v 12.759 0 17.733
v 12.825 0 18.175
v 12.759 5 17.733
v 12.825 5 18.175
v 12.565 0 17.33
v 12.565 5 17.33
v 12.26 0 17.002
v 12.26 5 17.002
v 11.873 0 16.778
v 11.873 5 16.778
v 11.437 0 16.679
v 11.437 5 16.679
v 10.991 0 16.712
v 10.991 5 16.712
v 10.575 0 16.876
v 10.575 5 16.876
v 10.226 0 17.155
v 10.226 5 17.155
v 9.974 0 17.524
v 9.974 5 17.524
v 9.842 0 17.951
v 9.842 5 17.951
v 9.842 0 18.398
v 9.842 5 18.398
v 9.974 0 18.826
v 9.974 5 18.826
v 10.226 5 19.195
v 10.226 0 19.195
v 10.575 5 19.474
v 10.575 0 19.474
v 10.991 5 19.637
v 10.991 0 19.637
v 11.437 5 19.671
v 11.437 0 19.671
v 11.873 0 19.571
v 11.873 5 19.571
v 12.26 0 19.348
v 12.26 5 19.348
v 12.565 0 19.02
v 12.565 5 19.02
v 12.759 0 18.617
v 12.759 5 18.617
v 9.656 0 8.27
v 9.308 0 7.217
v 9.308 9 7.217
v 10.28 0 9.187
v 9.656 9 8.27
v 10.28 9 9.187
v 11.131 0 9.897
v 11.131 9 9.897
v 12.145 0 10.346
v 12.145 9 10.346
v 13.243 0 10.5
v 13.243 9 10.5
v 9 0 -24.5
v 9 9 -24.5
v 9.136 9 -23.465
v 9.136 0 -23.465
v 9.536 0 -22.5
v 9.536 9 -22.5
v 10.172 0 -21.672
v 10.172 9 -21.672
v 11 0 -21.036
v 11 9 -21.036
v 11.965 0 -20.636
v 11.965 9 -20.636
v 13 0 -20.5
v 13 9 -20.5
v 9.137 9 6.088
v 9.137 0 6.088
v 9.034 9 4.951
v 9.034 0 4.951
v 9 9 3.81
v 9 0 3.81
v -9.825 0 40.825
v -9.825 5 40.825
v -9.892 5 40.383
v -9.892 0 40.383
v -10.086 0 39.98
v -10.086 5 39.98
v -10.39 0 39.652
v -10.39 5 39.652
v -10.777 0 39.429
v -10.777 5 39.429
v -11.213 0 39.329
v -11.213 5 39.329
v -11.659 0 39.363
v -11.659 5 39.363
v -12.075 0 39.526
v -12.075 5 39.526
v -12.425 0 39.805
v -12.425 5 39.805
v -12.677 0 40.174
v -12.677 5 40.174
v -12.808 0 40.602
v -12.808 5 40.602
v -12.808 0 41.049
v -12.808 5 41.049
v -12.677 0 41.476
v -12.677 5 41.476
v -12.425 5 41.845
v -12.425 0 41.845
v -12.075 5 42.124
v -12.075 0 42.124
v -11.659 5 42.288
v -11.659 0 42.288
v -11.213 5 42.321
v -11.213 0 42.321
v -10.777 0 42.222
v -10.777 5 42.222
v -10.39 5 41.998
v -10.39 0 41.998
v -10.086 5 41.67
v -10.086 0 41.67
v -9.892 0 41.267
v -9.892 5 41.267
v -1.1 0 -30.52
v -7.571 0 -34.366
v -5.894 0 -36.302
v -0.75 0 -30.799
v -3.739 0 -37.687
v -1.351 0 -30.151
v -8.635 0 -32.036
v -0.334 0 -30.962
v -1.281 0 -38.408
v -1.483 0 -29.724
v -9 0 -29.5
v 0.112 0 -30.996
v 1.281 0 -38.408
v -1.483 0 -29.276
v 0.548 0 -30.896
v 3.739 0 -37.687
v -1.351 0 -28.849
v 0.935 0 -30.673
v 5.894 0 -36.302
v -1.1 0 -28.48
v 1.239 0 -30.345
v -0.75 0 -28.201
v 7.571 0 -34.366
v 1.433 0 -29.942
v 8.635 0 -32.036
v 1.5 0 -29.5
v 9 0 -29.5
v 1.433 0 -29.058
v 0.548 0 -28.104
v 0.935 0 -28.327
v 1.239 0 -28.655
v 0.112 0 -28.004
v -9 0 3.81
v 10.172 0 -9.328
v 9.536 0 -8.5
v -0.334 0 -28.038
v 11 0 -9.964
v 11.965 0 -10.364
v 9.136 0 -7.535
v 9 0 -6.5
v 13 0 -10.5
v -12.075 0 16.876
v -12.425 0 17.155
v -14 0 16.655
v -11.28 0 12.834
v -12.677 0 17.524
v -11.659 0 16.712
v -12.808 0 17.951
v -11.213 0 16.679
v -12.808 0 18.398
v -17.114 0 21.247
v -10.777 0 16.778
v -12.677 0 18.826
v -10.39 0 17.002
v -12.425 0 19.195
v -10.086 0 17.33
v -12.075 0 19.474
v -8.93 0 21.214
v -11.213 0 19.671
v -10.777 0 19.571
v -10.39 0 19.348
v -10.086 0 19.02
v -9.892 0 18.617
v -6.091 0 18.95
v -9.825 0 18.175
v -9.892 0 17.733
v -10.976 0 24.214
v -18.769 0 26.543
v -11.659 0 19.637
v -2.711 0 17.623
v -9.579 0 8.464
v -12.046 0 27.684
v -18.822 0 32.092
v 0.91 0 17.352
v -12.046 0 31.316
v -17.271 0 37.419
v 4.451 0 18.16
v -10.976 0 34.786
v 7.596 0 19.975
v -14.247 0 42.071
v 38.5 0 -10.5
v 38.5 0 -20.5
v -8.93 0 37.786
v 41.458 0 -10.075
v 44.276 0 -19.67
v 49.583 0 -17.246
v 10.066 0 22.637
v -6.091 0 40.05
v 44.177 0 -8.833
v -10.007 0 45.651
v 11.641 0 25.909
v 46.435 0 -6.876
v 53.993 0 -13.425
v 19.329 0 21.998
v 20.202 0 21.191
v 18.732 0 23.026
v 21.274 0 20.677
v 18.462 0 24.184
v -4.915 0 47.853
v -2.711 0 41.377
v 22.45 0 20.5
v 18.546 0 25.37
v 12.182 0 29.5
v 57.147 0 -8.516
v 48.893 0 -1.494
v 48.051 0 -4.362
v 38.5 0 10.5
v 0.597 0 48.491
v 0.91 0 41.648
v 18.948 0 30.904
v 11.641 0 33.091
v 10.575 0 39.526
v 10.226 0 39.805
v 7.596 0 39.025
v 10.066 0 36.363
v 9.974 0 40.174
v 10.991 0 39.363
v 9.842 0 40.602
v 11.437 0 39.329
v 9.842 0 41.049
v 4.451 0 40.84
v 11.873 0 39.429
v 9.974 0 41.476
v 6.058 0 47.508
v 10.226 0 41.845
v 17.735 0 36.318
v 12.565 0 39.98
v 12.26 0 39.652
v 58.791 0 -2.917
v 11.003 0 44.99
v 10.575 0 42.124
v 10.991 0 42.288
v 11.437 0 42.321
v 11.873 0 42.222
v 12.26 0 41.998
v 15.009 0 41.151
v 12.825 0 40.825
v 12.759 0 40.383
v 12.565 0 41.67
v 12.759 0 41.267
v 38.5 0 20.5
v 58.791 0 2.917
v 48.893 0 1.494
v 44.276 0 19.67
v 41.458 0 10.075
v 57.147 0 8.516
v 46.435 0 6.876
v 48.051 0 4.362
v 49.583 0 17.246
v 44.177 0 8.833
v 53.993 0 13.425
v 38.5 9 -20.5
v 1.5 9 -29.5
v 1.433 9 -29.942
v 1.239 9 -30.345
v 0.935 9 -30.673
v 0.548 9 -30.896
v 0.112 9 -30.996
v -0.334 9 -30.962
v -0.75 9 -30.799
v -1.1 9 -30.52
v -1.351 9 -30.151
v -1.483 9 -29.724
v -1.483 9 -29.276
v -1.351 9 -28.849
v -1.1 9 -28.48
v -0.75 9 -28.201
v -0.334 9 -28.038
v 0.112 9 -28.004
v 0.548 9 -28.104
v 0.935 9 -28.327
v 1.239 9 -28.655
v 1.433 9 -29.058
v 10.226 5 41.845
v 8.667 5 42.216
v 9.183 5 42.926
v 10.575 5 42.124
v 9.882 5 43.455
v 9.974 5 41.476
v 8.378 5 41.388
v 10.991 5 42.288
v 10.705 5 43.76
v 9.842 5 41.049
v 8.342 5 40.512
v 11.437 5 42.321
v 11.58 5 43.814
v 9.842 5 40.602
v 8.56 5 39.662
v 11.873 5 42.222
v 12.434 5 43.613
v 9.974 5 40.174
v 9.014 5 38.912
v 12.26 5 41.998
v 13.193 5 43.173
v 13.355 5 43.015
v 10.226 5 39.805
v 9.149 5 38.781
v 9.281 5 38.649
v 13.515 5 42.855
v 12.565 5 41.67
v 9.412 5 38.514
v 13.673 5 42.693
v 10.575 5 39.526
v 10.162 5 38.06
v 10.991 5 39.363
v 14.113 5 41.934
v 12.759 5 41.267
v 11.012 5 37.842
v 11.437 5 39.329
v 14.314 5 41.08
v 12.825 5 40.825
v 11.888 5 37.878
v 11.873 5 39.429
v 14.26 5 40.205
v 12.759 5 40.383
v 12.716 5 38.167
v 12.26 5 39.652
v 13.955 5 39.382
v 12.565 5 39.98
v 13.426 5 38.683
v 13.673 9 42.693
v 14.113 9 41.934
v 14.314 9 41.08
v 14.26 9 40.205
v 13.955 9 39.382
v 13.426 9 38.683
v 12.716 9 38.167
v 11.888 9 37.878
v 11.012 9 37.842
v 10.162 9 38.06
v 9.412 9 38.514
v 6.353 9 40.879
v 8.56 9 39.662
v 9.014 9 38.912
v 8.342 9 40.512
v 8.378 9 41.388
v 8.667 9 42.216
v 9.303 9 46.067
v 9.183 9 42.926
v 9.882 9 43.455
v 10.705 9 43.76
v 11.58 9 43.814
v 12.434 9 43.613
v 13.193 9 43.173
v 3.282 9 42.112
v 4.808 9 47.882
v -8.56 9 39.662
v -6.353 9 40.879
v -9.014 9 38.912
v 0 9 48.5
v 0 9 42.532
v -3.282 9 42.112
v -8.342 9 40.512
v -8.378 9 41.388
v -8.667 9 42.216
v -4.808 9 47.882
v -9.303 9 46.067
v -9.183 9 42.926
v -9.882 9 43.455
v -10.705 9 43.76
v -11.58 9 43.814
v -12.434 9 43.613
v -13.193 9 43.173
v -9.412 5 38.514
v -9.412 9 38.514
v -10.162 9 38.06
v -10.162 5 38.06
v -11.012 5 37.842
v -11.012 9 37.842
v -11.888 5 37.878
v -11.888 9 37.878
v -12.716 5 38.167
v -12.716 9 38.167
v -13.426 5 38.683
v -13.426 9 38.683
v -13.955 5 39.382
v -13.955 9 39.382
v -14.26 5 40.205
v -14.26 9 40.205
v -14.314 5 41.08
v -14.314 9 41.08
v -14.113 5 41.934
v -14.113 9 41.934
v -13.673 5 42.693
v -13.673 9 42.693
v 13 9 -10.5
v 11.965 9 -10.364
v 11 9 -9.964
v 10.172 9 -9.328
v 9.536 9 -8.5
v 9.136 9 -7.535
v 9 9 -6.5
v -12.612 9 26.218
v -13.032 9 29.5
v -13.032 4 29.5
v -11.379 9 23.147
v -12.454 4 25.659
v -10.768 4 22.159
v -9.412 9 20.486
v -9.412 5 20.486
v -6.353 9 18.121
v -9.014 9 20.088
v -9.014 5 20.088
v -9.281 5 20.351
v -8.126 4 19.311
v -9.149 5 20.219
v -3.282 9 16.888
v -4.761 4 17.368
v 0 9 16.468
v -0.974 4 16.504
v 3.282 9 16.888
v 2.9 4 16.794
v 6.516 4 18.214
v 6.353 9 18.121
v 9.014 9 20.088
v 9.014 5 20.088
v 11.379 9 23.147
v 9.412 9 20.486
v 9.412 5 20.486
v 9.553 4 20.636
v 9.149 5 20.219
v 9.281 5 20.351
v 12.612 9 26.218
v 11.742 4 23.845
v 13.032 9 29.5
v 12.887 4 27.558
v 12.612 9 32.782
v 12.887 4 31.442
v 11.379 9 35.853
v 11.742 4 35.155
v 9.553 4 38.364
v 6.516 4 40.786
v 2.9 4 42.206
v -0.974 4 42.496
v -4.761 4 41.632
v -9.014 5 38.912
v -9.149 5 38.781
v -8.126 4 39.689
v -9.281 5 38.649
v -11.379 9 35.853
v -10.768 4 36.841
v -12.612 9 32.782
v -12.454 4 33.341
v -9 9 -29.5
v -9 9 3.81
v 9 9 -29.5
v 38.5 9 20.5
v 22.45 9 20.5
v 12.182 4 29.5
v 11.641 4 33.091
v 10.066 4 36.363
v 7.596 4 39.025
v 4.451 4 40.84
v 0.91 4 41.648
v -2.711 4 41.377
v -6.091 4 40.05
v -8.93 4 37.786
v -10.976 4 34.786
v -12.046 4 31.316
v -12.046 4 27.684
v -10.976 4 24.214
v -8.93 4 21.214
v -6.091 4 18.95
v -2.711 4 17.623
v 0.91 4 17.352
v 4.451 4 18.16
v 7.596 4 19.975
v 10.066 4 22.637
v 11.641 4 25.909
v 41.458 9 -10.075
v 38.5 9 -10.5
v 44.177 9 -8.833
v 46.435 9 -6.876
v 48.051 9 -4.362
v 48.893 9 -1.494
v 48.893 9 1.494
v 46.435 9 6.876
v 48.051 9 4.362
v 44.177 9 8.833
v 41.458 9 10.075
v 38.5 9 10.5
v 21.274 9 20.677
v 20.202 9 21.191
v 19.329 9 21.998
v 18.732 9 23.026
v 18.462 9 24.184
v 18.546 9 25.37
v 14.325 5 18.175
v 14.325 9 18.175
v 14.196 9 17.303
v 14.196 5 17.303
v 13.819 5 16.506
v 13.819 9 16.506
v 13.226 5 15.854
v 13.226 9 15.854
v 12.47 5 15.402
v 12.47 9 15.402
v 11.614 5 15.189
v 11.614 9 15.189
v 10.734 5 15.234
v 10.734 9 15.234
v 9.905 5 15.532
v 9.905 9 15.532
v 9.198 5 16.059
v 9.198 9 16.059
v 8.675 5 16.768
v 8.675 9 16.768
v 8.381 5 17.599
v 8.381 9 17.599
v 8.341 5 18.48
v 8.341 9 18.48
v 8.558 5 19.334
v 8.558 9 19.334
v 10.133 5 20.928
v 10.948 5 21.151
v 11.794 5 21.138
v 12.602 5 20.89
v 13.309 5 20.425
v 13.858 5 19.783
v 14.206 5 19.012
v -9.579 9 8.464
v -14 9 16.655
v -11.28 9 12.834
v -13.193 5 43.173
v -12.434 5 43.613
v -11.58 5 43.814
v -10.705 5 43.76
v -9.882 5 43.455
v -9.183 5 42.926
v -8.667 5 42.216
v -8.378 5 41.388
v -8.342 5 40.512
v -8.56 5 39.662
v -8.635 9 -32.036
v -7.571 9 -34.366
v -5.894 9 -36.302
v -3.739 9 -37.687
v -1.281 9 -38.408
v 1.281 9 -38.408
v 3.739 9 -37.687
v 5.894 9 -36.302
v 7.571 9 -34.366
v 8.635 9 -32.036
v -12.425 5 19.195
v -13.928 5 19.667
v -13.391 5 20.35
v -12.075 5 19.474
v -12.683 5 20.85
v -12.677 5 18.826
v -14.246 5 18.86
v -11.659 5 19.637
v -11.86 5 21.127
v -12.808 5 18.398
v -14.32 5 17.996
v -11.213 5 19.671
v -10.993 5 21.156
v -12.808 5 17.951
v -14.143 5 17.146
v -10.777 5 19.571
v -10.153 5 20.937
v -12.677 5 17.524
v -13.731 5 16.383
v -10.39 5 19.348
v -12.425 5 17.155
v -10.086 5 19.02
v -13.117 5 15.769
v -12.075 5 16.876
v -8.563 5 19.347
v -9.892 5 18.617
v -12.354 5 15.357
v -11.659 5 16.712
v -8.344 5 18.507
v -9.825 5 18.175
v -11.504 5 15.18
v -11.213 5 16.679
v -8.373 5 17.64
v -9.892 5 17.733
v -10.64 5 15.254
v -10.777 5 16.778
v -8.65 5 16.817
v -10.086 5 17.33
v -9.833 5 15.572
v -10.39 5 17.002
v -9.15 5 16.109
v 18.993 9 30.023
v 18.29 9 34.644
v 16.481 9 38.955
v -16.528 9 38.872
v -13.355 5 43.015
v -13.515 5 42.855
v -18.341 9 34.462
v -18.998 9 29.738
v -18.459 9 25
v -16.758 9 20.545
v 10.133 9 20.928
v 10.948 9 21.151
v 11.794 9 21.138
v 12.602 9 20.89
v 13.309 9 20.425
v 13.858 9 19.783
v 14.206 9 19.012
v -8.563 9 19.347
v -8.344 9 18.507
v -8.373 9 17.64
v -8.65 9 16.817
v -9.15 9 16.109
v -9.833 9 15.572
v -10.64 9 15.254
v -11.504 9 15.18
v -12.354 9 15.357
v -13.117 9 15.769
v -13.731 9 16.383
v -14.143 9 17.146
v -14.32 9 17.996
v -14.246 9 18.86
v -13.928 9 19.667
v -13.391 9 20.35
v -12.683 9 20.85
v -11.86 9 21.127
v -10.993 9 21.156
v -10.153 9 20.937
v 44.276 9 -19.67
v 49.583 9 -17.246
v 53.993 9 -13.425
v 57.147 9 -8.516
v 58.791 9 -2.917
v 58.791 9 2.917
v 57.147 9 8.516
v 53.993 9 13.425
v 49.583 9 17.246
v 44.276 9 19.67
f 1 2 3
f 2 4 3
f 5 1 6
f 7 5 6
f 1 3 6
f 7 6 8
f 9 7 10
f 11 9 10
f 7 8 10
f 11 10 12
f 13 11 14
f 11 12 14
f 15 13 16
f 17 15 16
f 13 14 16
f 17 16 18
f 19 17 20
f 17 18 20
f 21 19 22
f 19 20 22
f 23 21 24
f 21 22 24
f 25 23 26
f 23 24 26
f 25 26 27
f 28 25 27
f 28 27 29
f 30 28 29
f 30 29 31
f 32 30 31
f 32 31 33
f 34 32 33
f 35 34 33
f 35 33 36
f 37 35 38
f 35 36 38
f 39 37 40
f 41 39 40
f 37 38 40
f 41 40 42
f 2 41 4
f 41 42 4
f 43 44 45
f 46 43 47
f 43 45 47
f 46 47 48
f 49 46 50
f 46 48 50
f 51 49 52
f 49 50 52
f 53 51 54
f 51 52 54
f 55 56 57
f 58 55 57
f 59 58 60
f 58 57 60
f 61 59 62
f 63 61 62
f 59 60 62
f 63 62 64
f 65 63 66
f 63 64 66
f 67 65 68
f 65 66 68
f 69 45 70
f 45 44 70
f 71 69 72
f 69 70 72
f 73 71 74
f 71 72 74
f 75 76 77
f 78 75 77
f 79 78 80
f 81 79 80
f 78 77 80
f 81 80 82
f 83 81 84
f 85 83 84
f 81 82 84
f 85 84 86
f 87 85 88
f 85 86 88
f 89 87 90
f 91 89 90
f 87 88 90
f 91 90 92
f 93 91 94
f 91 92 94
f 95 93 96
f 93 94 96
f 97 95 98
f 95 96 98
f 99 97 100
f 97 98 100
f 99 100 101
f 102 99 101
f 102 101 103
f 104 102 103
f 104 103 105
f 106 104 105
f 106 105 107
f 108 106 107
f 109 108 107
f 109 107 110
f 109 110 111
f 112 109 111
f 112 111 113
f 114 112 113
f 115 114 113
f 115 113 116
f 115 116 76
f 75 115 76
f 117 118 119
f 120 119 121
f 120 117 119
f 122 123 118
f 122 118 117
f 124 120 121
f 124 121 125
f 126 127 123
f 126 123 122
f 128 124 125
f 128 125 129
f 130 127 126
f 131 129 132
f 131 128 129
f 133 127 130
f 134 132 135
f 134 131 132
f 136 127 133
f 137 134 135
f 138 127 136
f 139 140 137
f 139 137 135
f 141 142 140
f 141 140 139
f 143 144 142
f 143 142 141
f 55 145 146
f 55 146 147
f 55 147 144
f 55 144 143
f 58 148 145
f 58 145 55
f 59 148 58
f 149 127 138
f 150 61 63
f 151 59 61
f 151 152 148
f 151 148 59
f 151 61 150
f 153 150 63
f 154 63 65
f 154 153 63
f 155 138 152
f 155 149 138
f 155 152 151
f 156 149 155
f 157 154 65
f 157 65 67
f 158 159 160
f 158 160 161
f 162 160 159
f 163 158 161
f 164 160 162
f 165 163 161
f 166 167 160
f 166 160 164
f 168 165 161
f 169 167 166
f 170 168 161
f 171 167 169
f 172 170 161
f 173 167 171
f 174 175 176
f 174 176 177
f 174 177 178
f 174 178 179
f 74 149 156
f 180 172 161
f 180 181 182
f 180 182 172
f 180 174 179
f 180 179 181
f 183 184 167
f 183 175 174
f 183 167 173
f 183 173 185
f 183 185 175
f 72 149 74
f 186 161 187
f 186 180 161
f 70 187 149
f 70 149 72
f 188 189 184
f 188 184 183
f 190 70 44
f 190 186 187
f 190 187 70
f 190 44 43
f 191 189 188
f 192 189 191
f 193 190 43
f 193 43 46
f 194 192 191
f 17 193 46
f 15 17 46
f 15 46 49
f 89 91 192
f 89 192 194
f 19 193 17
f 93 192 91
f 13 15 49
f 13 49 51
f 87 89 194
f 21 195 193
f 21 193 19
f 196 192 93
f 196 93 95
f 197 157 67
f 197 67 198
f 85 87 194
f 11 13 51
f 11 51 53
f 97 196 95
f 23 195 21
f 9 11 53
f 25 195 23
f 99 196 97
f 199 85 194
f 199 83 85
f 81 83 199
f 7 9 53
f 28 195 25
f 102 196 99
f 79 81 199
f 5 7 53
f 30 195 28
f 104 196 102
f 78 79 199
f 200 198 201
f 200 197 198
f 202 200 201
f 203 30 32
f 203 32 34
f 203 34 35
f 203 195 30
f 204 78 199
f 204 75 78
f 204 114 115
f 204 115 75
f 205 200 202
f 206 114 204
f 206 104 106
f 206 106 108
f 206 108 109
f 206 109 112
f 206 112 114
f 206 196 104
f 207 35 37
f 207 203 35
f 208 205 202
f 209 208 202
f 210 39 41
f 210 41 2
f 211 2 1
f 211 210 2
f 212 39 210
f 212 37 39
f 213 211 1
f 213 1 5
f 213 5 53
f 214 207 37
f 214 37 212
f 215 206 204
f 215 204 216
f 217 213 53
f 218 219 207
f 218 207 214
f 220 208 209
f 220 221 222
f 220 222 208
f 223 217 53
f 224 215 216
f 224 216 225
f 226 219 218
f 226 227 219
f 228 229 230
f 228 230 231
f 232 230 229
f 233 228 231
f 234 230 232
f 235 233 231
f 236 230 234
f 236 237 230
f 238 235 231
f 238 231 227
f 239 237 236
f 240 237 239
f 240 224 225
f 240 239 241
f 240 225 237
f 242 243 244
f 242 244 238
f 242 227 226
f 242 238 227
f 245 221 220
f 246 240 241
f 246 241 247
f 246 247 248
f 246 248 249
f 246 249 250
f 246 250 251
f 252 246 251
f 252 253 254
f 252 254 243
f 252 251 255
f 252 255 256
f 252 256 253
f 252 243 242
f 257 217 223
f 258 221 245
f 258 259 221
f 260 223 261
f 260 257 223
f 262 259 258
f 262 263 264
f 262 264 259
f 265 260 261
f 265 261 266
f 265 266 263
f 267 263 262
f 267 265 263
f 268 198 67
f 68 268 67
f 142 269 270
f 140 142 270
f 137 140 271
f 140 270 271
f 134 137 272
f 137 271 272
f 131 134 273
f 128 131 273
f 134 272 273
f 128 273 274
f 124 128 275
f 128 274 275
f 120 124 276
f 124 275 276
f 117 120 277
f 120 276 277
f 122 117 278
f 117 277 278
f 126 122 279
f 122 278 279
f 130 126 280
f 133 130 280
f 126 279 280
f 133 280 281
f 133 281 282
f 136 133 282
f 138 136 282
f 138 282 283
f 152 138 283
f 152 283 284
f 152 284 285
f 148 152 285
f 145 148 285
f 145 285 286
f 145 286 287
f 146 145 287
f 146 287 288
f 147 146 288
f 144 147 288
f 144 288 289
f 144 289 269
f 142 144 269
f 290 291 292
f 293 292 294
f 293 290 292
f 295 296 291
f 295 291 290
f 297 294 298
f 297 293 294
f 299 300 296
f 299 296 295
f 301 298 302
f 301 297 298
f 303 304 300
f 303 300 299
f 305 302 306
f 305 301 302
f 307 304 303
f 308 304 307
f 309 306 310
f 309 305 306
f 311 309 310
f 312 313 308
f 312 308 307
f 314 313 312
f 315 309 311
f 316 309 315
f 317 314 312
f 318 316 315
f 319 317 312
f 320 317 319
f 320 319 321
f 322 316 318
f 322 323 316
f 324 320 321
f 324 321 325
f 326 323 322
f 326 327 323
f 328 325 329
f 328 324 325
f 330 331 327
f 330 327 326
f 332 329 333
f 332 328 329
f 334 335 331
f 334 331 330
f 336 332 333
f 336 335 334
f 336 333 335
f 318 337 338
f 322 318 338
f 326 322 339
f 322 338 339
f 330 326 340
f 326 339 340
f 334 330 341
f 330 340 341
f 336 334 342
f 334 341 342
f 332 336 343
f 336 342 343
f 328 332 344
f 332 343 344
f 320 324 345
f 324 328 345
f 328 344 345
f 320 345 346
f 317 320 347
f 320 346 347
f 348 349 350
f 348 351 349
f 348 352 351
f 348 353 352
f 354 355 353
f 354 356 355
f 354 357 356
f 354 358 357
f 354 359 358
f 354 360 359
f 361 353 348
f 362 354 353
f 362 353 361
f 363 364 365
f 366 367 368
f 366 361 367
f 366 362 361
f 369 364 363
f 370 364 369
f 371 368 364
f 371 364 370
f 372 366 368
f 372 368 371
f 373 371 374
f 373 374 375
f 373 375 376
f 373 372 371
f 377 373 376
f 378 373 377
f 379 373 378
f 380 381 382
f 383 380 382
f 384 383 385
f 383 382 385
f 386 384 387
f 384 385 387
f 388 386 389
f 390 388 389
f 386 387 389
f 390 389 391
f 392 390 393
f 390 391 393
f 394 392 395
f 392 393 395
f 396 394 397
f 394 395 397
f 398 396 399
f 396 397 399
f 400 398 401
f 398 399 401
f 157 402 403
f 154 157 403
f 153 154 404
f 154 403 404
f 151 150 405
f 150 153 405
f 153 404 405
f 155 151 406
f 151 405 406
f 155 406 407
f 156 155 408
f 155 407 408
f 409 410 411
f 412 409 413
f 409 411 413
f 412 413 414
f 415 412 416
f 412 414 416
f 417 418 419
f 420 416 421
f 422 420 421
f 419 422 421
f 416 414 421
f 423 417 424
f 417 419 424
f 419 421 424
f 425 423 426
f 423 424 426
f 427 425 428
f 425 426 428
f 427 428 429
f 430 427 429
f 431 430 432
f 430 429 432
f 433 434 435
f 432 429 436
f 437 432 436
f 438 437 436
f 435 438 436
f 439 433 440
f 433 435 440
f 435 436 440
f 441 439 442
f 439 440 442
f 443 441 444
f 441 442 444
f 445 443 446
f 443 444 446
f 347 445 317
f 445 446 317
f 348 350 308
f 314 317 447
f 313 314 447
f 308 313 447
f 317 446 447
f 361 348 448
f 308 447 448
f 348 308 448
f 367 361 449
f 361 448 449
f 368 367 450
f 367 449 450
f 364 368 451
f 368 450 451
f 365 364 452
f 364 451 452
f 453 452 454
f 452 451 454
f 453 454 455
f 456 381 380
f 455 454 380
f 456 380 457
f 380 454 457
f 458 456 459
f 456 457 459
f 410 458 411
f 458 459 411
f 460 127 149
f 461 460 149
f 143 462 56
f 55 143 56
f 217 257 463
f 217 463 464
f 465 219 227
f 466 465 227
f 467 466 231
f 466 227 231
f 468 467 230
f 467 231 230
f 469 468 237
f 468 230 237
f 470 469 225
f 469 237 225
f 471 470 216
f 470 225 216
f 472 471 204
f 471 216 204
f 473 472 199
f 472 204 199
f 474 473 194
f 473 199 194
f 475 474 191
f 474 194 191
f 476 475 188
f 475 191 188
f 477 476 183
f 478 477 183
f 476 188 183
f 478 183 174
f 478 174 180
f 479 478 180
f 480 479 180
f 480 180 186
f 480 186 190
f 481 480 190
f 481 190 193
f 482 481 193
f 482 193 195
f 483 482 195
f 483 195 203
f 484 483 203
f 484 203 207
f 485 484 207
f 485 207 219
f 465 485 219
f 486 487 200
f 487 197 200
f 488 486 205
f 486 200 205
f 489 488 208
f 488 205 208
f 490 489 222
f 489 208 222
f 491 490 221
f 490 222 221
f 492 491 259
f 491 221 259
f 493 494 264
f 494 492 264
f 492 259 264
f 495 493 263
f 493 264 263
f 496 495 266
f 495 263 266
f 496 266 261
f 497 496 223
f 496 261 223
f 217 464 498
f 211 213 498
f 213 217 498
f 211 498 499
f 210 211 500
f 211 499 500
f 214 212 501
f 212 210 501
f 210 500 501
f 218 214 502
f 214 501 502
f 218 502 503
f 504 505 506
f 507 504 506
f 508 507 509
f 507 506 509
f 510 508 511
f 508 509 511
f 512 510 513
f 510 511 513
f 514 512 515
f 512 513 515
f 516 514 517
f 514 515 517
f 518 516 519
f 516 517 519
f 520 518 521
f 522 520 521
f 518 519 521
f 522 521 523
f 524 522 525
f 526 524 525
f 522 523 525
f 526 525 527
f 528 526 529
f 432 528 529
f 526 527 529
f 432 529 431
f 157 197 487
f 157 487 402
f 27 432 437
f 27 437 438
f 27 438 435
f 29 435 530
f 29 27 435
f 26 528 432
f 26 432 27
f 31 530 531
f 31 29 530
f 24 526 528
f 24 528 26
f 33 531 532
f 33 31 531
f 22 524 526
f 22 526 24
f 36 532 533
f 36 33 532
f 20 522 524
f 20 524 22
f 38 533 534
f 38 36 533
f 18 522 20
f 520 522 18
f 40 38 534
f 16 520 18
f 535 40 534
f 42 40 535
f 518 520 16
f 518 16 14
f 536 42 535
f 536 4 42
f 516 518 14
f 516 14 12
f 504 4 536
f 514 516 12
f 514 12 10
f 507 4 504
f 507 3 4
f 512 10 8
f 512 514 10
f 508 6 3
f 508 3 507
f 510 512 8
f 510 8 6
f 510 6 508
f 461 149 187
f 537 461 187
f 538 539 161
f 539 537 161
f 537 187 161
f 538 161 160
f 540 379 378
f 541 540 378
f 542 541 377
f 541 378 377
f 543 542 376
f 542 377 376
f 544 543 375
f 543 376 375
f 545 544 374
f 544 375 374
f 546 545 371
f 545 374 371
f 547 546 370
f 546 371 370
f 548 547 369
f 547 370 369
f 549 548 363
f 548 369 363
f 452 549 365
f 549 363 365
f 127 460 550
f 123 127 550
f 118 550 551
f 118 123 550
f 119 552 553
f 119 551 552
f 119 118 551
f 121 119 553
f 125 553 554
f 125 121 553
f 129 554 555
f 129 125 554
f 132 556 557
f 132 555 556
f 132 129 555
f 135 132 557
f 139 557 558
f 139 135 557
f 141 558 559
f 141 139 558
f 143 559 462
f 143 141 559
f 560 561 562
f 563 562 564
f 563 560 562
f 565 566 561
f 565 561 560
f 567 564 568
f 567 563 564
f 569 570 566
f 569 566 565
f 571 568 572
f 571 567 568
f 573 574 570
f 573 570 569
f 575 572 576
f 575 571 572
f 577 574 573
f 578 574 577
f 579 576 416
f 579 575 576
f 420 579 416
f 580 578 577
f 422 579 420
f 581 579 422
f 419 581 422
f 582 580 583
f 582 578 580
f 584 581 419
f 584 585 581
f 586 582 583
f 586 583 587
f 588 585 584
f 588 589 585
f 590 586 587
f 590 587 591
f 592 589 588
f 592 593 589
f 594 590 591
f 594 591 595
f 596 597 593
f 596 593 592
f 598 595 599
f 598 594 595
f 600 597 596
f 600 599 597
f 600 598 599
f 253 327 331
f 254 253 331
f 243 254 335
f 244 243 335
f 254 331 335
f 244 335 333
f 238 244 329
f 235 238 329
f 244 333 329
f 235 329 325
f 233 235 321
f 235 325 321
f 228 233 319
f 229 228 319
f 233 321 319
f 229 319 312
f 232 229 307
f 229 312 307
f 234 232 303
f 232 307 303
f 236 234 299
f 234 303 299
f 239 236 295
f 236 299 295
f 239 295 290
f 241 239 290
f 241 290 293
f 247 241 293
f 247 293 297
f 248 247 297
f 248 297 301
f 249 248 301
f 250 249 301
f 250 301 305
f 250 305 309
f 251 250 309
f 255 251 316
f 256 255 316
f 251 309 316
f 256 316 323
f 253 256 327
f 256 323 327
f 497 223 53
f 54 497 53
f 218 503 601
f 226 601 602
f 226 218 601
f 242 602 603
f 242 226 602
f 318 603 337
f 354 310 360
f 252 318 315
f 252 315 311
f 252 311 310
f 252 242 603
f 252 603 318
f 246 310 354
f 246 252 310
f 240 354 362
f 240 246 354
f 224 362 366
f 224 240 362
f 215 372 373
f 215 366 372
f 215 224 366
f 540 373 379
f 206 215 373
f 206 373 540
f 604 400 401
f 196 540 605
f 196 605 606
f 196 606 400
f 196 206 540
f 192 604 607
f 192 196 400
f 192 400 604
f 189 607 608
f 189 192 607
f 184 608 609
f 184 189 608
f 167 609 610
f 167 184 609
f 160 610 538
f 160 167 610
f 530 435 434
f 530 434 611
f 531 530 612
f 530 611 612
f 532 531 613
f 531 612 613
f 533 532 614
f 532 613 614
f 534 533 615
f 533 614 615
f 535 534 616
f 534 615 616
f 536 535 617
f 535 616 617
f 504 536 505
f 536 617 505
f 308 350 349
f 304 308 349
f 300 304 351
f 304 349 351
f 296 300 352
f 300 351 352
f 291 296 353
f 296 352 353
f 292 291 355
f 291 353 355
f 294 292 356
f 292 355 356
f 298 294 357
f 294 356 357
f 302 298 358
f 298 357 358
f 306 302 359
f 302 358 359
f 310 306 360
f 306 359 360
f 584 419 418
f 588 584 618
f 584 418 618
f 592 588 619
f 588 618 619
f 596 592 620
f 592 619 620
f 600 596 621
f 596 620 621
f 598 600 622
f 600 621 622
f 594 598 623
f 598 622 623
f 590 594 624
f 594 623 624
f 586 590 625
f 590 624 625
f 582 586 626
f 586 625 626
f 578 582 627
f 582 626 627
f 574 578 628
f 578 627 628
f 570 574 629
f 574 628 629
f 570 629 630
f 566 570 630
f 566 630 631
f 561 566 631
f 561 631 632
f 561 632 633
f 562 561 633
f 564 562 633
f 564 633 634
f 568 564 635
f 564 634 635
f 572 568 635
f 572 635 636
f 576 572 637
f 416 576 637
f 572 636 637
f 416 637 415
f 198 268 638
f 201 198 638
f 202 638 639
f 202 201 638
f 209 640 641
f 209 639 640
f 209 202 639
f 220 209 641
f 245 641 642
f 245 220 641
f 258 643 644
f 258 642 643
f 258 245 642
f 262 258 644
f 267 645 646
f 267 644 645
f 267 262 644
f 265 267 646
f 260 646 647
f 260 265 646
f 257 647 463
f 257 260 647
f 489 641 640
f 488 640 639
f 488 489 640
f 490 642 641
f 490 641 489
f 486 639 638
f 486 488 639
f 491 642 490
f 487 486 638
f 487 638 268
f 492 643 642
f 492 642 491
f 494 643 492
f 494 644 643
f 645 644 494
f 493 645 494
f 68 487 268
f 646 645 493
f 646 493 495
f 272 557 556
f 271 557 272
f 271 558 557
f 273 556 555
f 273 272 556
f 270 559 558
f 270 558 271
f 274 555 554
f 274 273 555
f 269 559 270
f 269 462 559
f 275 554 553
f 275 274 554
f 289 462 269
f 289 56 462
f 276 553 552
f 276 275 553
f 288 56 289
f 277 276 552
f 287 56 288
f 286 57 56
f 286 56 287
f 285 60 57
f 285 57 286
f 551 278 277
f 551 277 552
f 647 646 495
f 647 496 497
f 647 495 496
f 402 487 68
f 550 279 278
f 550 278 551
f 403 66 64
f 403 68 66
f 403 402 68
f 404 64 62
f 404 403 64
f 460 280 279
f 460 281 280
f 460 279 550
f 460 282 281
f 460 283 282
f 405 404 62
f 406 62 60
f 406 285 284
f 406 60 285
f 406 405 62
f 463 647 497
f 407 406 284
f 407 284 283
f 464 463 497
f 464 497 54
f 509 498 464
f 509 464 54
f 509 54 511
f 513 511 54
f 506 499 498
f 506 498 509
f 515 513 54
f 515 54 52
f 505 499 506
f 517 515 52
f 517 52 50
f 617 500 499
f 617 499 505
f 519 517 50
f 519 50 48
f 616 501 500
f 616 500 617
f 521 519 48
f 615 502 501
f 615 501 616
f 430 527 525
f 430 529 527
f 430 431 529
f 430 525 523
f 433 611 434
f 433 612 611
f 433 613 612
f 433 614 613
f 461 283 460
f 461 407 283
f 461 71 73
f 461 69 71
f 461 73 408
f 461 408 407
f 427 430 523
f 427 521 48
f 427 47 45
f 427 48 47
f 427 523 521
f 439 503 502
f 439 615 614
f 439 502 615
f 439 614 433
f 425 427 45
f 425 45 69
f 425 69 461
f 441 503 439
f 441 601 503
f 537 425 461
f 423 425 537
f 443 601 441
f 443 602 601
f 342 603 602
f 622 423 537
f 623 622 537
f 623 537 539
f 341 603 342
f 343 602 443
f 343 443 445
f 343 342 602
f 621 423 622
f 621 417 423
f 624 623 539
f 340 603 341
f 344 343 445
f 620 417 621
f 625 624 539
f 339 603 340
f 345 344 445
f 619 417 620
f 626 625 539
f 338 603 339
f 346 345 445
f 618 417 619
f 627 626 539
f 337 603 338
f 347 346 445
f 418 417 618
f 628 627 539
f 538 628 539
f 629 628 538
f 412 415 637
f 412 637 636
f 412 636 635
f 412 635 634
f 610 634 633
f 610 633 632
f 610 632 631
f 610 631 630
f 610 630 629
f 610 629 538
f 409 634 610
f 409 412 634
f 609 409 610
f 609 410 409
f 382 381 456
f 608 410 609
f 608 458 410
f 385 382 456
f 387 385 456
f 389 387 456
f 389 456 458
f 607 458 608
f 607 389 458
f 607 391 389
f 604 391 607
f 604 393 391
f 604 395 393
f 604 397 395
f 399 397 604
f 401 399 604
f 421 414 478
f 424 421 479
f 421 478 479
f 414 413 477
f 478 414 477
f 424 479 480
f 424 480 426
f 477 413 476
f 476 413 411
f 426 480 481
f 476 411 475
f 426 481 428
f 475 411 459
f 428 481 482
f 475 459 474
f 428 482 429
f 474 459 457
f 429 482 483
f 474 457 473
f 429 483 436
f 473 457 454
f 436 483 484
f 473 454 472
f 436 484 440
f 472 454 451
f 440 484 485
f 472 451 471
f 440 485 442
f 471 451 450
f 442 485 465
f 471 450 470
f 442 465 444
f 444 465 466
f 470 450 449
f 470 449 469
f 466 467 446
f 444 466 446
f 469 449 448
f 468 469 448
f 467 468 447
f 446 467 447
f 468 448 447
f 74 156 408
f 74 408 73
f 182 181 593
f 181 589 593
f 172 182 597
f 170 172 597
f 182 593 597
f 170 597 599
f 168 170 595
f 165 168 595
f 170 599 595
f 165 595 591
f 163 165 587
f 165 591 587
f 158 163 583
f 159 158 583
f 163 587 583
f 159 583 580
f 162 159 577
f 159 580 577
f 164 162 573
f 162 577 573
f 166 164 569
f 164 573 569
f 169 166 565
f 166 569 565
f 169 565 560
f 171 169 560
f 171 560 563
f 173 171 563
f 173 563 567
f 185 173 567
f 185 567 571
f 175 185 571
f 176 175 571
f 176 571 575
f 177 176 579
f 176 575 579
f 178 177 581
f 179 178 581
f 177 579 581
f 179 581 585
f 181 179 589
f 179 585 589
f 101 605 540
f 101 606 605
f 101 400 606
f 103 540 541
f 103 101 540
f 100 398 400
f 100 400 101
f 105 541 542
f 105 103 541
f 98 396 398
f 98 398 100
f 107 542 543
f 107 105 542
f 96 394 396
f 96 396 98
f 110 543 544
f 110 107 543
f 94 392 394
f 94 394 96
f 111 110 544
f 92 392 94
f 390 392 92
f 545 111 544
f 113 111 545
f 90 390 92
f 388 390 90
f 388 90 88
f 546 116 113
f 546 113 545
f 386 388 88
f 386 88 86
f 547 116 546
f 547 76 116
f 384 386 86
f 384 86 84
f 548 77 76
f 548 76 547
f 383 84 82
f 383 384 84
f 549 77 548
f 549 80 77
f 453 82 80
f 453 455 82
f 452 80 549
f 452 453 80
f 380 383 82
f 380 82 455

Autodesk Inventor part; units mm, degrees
ref_plane "YZ Plane" through (0, 0, 0) normal (1, 0, 0) x (0, 1, 0)
ref_plane "XZ Plane" through (0, 0, 0) normal (0, 1, 0) x (-1, 0, 0)
ref_plane "XY Plane" through (0, 0, 0) normal (0, 0, 1) x (1, 0, 0)
sketch "Sketch1" plane through (0, 0, 0) normal (0, 1, 0) x (-1, 0, 0)
  line L0 (0, -55.9) -> (0, 65.9) construction
  line L1 (0, 29.5) -> (0, -29.5) construction
  arc A0 (14, 16.6548) -> (-14, 16.6548) centre (0, 29.5) ccw
  arc A1 (-9, -29.5) -> (9, -29.5) centre (0, -29.5) ccw
  line L2 (9, -29.5) -> (9, 3.8095)
  arc A2 (14, 16.6548) -> (9, 3.8095) centre (28, 3.8095) ccw
  line L3 (-9, -29.5) -> (-9, 3.8095)
  arc A3 (-9, 3.8095) -> (-14, 16.6548) centre (-28, 3.8095) ccw
  circle A4 centre (0, 29.5) radius 13.0325
  circle A5 centre (-38.5, 0) radius 10.5
  arc A6 (-38.5, 20.5) -> (-38.5, -20.5) centre (-38.5, 0) ccw
  line L4 (-38.5, 20.5) -> (-16.7332, 20.5)
  line L5 (-38.5, -20.5) -> (-9, -20.5)
  line L6 (-38.5, -10.5) -> (-9, -10.5)
  line L7 (-38.5, 10.5) -> (-10.2169, 10.5)
  point P0 (0, 0)
  point P1 (0, 0)
  point P2 (0, -38.5)
  point P3 (-5.5975, 47.6568)
  point P4 (-18.642, 33.1709)
  point P5 (-35.056, 9.9191)
  point P6 (-9, -28.5)
  point P7 (-59, 0)
  dimension "d0" = 59
  dimension "d1" = 29.5
  dimension "d2" = 38
  dimension "d3" = 18
  dimension "d4" = 19
  dimension "d5" = 26.065
  dimension "d31" = 10
  dimension "d32" = 59
extrude "Extrusion1" add sketch "Sketch1" along normal blind 9 contours A2 L2 A1 L3 A3 A0 | A0 A3 L7 A5 L6 L3 L5 A6 L4
sketch "Sketch2" plane through (0, 0, 0) normal (0, -1, 0) x (1, 0, 0)
  circle A0 centre (0, 29.5) radius 13.0325 projected
  circle A1 centre (0, 29.5) radius 12.1825
  point P0 (0, 0)
  dimension "d8" = 0.85
extrude "Extrusion2" add sketch "Sketch2" against normal blind 4
sketch "Sketch3" plane through (0, 9, 0) normal (0, 1, 0) x (1, 0, 0)
  arc A0 (9, 29.5) -> (-9, 29.5) centre (0, 29.5) ccw projected
  circle A1 centre (0, 29.5) radius 1.5
  point P0 (0, 0)
  point P1 (0, 38.5)
  dimension "d11" = 3
extrude "Extrusion3" cut sketch "Sketch3" against normal through all
sketch "Sketch4" plane through (0, 9, 0) normal (0, 1, 0) x (1, 0, 0)
  circle A0 centre (0, -29.5) radius 12.1825 projected
  line L0 (0, -29.5) -> (0, -21.0642) construction
  circle A1 centre (0, -29.5) radius 16.0162 construction
  circle A2 centre (0, -29.5) radius 13.0325 projected
  line L1 (-13.0325, -29.5) -> (-16.0162, -29.5) construction
  line L2 (-16.0162, -29.5) -> (-19, -29.5) construction
  arc A3 (-14, -16.6548) -> (16.7332, -20.5) centre (0, -29.5) ccw projected
  line L3 (0, -29.5) -> (-11.3252, -18.1748) construction
  circle A4 centre (-11.3252, -18.1748) radius 1.5
  circle A5 centre (-11.3252, -40.8252) radius 1.5
  circle A6 centre (11.3252, -40.8252) radius 1.5
  circle A7 centre (11.3252, -18.1748) radius 1.5
  point P0 (0, 0)
  point P1 (14, -16.6548)
  dimension "d14" = 45
  dimension "d15" = 3
  dimension "d18" = 360
extrude "Extrusion4" cut sketch "Sketch4" against normal through all contours A4 | A5 | A6 | A7
sketch "Sketch5" plane through (0, 9, 0) normal (0, 1, 0) x (1, 0, 0)
  circle A0 centre (-11.3252, -40.8252) radius 1.5 projected
  circle A1 centre (-11.3252, -40.8252) radius 3
  circle A2 centre (-11.3252, -18.1748) radius 1.5 projected
  circle A3 centre (-11.3252, -18.1748) radius 3
  circle A4 centre (11.3252, -40.8252) radius 1.5 projected
  circle A5 centre (11.3252, -40.8252) radius 3
  circle A6 centre (11.3252, -18.1748) radius 1.5 projected
  circle A7 centre (11.3252, -18.1748) radius 3
  point P0 (0, 0)
  dimension "d22" = 6
  dimension "d23" = 6
  dimension "d24" = 6
  dimension "d25" = 6
extrude "Extrusion5" cut sketch "Sketch5" against normal blind 4 contours A0 | A1 | A2 | A3 | A4 | A5 | A6 | A7
fillet "Fillet2" radius 4 4 edges at (16.7332, 4.5, 20.5) (10.2169, 4.5, 10.5) (9, 4.5, -10.5) (9, 4.5, -20.5)
equation "\"d1\" = 0.5 * d0"
equation "\"d4\" = 0.5 * d2"
properties part number "leg_extend_3DPrint"
